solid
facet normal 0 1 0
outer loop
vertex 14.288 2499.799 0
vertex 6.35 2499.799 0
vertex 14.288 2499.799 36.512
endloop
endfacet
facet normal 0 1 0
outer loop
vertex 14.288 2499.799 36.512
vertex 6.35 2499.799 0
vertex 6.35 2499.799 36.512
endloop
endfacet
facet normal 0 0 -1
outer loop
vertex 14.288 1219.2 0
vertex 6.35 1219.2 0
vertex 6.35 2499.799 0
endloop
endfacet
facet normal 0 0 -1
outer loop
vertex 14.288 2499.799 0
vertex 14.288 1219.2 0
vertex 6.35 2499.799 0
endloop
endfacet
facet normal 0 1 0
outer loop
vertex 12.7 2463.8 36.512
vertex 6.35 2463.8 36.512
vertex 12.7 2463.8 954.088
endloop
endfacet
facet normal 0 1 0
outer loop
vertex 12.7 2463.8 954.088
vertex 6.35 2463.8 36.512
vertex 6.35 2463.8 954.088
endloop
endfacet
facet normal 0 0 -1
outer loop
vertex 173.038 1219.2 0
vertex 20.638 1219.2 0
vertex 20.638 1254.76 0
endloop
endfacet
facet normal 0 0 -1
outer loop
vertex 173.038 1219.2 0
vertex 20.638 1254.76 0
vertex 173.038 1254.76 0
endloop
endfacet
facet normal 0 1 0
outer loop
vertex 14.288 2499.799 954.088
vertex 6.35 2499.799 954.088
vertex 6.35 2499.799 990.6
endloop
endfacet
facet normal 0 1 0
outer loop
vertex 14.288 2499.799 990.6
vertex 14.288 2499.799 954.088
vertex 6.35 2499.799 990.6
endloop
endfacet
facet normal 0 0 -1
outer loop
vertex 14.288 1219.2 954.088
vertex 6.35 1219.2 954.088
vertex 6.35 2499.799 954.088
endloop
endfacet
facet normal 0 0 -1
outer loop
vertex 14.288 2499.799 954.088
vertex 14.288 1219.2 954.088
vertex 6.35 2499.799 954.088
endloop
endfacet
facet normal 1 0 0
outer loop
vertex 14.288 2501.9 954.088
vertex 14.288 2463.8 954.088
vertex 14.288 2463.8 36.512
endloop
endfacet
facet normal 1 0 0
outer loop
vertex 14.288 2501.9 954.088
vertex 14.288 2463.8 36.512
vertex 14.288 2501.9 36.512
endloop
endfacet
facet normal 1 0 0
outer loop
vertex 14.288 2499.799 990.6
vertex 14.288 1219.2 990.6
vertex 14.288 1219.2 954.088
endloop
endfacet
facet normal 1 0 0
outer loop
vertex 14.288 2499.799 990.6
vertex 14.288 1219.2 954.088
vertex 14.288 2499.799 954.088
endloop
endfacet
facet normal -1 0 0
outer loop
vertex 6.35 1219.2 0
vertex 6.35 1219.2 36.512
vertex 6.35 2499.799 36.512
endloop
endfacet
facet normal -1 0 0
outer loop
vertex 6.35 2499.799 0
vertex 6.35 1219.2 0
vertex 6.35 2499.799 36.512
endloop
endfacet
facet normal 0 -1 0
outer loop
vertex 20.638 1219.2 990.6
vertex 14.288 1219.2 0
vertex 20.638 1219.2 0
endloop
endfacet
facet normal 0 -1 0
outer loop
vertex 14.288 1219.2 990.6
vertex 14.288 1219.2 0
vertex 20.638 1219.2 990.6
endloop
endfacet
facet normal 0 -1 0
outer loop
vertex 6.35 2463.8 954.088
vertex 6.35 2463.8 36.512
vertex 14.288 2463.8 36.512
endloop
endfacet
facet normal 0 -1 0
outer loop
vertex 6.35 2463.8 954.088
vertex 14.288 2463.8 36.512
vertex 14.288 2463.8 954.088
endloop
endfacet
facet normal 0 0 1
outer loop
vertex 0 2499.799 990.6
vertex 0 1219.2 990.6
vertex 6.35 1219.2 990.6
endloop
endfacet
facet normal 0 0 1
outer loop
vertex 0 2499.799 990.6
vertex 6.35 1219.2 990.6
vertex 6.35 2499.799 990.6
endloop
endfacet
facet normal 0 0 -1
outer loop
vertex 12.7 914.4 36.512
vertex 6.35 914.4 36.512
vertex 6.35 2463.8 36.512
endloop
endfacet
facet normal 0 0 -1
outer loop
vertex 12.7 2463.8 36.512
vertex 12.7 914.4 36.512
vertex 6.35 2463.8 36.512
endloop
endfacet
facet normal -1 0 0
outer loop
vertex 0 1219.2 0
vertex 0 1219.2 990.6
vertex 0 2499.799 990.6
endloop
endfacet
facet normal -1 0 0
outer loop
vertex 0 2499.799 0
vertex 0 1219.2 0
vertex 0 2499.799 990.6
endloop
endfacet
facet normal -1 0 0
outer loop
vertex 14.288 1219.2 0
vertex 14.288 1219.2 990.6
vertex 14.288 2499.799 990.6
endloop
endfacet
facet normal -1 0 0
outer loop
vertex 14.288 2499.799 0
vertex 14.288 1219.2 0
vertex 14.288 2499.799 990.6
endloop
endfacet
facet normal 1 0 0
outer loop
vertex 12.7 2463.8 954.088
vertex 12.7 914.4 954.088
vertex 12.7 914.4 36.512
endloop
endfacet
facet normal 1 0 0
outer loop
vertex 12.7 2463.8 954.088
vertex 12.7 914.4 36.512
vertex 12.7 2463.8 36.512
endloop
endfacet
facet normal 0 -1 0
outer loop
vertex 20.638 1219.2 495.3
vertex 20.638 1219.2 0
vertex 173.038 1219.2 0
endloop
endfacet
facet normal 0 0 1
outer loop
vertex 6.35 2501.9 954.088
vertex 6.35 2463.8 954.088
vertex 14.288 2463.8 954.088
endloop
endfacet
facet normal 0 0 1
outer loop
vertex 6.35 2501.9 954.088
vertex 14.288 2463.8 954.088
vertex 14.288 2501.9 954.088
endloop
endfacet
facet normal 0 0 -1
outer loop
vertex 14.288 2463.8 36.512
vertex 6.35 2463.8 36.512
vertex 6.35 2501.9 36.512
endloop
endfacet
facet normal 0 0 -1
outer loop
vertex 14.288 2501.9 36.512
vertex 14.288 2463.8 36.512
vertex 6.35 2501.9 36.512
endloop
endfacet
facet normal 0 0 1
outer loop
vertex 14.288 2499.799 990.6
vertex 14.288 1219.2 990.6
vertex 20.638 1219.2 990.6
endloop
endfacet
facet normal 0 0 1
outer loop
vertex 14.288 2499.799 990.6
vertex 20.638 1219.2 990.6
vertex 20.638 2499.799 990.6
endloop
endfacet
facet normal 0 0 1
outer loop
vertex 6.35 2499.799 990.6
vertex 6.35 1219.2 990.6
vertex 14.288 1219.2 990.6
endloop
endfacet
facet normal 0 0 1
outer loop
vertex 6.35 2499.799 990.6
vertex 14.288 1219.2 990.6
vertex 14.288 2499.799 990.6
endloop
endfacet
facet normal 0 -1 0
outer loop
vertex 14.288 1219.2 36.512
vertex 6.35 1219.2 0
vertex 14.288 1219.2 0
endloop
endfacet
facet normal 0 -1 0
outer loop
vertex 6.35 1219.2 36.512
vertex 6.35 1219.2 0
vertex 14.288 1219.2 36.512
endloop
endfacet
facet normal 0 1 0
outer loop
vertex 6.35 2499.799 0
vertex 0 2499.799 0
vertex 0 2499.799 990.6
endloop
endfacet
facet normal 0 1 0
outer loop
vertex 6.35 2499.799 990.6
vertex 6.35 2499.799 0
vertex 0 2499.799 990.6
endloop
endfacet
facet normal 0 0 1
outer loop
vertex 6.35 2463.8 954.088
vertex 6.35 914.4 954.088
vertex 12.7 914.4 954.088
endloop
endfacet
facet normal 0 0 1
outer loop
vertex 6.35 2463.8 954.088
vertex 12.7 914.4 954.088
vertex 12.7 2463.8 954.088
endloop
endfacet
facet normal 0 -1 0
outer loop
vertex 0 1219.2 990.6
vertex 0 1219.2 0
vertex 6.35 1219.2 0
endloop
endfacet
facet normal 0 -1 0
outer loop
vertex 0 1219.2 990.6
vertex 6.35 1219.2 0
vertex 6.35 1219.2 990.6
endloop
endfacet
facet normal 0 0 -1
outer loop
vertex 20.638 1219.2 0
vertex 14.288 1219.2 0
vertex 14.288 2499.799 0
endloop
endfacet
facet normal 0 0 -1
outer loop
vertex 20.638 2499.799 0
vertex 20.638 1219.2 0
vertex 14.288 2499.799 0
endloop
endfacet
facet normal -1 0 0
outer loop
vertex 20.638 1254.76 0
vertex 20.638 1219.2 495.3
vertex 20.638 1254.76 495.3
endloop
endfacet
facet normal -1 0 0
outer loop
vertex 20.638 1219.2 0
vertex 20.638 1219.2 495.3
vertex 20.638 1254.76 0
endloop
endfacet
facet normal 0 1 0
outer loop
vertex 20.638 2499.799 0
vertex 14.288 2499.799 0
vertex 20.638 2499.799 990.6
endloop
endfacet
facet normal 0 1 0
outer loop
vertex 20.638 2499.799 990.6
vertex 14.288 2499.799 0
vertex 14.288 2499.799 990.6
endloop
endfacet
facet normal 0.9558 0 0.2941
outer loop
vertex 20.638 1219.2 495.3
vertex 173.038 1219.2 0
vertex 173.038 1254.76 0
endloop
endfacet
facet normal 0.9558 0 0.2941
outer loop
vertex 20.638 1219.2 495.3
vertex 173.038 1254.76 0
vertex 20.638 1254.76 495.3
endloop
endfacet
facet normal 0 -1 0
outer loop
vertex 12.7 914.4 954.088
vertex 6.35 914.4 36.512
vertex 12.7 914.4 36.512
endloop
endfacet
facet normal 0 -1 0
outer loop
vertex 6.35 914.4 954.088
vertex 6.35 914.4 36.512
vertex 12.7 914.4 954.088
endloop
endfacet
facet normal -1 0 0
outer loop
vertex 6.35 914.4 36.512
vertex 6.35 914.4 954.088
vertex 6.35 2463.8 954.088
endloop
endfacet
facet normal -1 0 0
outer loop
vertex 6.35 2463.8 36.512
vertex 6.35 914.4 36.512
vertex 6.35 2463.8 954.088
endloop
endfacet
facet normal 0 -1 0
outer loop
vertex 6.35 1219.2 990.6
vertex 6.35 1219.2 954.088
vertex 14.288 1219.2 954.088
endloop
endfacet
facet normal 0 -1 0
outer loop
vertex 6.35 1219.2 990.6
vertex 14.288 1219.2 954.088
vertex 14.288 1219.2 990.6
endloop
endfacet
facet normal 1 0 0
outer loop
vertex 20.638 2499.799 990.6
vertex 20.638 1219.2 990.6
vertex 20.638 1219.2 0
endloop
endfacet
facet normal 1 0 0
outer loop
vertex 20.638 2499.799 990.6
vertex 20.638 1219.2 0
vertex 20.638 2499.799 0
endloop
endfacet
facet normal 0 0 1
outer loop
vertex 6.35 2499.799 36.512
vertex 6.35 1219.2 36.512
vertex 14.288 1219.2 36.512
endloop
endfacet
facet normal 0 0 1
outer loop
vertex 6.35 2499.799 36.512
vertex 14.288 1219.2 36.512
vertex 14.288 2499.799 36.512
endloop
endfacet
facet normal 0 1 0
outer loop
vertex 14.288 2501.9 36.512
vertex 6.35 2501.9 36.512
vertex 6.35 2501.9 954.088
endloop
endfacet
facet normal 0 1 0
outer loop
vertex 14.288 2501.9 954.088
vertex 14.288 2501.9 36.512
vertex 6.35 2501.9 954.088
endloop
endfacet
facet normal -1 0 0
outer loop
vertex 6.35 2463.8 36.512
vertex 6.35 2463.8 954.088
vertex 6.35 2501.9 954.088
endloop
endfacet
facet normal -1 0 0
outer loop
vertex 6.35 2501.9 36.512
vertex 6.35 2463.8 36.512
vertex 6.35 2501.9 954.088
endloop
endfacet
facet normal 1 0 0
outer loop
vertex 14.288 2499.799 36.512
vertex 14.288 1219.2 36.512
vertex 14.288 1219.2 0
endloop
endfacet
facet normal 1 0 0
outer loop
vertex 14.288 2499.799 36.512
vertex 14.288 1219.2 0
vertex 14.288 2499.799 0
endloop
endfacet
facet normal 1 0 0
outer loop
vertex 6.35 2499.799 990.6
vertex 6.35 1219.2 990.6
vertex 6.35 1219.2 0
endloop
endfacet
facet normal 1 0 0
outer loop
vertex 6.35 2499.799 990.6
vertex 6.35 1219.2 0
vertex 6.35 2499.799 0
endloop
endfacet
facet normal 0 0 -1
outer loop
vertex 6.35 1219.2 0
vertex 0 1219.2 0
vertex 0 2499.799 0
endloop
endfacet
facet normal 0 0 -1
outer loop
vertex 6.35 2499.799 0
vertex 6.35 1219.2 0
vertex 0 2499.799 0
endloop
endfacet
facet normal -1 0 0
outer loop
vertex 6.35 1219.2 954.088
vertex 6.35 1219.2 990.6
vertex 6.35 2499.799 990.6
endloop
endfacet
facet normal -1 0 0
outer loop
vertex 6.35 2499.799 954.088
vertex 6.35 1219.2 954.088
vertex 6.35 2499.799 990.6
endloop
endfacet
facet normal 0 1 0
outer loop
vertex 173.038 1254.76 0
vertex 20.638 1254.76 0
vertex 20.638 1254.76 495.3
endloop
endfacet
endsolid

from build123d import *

# Parameters (mm, degrees)
F1_W      = 1280.598775
F1_H      = 990.6
F2_DEPTH  = 6.35
F3_W      = 1280.598775
F3_H      = 36.5125
F4_DEPTH  = 7.9375
F5_W      = 38.1
F5_H      = 917.575
F6_DEPTH  = 7.9375
F7_W      = 1549.4
F7_H      = 917.575
F8_DEPTH  = 6.35
F9_W      = 1280.598775
F9_H      = 990.6
F10_DEPTH = 6.35
F12_DEPTH = 35.56


with BuildPart() as f2:
    # F1 (on Right) → F2 (new body)
    with BuildSketch(Plane.YZ):
        with Locations((1859.499388, 495.3)):
            Rectangle(F1_W, F1_H)
    extrude(amount=F2_DEPTH)


with BuildPart() as f4:
    # F3 (on face) → F4 (new body)
    with BuildSketch(Plane.YZ.offset(6.35)):
        with Locations((1859.499388, 972.34375)):
            Rectangle(F3_W, F3_H)
        with Locations((1859.499388, 18.25625)):
            Rectangle(F3_W, F3_H)
    extrude(amount=F4_DEPTH)


with BuildPart() as f6:
    # F5 (on face) → F6 (new body, through all)
    with BuildSketch(Plane.YZ.offset(6.35)):
        with Locations((2482.85, 495.3)):
            Rectangle(F5_W, F5_H)
    extrude(amount=F6_DEPTH)


with BuildPart() as f8:
    # F7 (on face) → F8 (new body)
    with BuildSketch(Plane.YZ.offset(6.35)):
        with Locations((1689.1, 495.3)):
            Rectangle(F7_W, F7_H)
    extrude(amount=F8_DEPTH)


with BuildPart() as f10:
    # F9 (on face) → F10 (new body)
    with BuildSketch(Plane.YZ.offset(14.2875)):
        with Locations((1859.499388, 495.3)):
            Rectangle(F9_W, F9_H)
    extrude(amount=F10_DEPTH)


with BuildPart() as f12:
    # F11 (on face) → F12 (new body)
    with BuildSketch(Plane.XZ.offset(-1219.2)):
        Polygon((20.6375, 495.3), (20.6375, 0), (173.0375, 0), align=None)
    extrude(amount=-F12_DEPTH)


solid = Compound([f2.part, f4.part, f6.part, f8.part, f10.part, f12.part])
